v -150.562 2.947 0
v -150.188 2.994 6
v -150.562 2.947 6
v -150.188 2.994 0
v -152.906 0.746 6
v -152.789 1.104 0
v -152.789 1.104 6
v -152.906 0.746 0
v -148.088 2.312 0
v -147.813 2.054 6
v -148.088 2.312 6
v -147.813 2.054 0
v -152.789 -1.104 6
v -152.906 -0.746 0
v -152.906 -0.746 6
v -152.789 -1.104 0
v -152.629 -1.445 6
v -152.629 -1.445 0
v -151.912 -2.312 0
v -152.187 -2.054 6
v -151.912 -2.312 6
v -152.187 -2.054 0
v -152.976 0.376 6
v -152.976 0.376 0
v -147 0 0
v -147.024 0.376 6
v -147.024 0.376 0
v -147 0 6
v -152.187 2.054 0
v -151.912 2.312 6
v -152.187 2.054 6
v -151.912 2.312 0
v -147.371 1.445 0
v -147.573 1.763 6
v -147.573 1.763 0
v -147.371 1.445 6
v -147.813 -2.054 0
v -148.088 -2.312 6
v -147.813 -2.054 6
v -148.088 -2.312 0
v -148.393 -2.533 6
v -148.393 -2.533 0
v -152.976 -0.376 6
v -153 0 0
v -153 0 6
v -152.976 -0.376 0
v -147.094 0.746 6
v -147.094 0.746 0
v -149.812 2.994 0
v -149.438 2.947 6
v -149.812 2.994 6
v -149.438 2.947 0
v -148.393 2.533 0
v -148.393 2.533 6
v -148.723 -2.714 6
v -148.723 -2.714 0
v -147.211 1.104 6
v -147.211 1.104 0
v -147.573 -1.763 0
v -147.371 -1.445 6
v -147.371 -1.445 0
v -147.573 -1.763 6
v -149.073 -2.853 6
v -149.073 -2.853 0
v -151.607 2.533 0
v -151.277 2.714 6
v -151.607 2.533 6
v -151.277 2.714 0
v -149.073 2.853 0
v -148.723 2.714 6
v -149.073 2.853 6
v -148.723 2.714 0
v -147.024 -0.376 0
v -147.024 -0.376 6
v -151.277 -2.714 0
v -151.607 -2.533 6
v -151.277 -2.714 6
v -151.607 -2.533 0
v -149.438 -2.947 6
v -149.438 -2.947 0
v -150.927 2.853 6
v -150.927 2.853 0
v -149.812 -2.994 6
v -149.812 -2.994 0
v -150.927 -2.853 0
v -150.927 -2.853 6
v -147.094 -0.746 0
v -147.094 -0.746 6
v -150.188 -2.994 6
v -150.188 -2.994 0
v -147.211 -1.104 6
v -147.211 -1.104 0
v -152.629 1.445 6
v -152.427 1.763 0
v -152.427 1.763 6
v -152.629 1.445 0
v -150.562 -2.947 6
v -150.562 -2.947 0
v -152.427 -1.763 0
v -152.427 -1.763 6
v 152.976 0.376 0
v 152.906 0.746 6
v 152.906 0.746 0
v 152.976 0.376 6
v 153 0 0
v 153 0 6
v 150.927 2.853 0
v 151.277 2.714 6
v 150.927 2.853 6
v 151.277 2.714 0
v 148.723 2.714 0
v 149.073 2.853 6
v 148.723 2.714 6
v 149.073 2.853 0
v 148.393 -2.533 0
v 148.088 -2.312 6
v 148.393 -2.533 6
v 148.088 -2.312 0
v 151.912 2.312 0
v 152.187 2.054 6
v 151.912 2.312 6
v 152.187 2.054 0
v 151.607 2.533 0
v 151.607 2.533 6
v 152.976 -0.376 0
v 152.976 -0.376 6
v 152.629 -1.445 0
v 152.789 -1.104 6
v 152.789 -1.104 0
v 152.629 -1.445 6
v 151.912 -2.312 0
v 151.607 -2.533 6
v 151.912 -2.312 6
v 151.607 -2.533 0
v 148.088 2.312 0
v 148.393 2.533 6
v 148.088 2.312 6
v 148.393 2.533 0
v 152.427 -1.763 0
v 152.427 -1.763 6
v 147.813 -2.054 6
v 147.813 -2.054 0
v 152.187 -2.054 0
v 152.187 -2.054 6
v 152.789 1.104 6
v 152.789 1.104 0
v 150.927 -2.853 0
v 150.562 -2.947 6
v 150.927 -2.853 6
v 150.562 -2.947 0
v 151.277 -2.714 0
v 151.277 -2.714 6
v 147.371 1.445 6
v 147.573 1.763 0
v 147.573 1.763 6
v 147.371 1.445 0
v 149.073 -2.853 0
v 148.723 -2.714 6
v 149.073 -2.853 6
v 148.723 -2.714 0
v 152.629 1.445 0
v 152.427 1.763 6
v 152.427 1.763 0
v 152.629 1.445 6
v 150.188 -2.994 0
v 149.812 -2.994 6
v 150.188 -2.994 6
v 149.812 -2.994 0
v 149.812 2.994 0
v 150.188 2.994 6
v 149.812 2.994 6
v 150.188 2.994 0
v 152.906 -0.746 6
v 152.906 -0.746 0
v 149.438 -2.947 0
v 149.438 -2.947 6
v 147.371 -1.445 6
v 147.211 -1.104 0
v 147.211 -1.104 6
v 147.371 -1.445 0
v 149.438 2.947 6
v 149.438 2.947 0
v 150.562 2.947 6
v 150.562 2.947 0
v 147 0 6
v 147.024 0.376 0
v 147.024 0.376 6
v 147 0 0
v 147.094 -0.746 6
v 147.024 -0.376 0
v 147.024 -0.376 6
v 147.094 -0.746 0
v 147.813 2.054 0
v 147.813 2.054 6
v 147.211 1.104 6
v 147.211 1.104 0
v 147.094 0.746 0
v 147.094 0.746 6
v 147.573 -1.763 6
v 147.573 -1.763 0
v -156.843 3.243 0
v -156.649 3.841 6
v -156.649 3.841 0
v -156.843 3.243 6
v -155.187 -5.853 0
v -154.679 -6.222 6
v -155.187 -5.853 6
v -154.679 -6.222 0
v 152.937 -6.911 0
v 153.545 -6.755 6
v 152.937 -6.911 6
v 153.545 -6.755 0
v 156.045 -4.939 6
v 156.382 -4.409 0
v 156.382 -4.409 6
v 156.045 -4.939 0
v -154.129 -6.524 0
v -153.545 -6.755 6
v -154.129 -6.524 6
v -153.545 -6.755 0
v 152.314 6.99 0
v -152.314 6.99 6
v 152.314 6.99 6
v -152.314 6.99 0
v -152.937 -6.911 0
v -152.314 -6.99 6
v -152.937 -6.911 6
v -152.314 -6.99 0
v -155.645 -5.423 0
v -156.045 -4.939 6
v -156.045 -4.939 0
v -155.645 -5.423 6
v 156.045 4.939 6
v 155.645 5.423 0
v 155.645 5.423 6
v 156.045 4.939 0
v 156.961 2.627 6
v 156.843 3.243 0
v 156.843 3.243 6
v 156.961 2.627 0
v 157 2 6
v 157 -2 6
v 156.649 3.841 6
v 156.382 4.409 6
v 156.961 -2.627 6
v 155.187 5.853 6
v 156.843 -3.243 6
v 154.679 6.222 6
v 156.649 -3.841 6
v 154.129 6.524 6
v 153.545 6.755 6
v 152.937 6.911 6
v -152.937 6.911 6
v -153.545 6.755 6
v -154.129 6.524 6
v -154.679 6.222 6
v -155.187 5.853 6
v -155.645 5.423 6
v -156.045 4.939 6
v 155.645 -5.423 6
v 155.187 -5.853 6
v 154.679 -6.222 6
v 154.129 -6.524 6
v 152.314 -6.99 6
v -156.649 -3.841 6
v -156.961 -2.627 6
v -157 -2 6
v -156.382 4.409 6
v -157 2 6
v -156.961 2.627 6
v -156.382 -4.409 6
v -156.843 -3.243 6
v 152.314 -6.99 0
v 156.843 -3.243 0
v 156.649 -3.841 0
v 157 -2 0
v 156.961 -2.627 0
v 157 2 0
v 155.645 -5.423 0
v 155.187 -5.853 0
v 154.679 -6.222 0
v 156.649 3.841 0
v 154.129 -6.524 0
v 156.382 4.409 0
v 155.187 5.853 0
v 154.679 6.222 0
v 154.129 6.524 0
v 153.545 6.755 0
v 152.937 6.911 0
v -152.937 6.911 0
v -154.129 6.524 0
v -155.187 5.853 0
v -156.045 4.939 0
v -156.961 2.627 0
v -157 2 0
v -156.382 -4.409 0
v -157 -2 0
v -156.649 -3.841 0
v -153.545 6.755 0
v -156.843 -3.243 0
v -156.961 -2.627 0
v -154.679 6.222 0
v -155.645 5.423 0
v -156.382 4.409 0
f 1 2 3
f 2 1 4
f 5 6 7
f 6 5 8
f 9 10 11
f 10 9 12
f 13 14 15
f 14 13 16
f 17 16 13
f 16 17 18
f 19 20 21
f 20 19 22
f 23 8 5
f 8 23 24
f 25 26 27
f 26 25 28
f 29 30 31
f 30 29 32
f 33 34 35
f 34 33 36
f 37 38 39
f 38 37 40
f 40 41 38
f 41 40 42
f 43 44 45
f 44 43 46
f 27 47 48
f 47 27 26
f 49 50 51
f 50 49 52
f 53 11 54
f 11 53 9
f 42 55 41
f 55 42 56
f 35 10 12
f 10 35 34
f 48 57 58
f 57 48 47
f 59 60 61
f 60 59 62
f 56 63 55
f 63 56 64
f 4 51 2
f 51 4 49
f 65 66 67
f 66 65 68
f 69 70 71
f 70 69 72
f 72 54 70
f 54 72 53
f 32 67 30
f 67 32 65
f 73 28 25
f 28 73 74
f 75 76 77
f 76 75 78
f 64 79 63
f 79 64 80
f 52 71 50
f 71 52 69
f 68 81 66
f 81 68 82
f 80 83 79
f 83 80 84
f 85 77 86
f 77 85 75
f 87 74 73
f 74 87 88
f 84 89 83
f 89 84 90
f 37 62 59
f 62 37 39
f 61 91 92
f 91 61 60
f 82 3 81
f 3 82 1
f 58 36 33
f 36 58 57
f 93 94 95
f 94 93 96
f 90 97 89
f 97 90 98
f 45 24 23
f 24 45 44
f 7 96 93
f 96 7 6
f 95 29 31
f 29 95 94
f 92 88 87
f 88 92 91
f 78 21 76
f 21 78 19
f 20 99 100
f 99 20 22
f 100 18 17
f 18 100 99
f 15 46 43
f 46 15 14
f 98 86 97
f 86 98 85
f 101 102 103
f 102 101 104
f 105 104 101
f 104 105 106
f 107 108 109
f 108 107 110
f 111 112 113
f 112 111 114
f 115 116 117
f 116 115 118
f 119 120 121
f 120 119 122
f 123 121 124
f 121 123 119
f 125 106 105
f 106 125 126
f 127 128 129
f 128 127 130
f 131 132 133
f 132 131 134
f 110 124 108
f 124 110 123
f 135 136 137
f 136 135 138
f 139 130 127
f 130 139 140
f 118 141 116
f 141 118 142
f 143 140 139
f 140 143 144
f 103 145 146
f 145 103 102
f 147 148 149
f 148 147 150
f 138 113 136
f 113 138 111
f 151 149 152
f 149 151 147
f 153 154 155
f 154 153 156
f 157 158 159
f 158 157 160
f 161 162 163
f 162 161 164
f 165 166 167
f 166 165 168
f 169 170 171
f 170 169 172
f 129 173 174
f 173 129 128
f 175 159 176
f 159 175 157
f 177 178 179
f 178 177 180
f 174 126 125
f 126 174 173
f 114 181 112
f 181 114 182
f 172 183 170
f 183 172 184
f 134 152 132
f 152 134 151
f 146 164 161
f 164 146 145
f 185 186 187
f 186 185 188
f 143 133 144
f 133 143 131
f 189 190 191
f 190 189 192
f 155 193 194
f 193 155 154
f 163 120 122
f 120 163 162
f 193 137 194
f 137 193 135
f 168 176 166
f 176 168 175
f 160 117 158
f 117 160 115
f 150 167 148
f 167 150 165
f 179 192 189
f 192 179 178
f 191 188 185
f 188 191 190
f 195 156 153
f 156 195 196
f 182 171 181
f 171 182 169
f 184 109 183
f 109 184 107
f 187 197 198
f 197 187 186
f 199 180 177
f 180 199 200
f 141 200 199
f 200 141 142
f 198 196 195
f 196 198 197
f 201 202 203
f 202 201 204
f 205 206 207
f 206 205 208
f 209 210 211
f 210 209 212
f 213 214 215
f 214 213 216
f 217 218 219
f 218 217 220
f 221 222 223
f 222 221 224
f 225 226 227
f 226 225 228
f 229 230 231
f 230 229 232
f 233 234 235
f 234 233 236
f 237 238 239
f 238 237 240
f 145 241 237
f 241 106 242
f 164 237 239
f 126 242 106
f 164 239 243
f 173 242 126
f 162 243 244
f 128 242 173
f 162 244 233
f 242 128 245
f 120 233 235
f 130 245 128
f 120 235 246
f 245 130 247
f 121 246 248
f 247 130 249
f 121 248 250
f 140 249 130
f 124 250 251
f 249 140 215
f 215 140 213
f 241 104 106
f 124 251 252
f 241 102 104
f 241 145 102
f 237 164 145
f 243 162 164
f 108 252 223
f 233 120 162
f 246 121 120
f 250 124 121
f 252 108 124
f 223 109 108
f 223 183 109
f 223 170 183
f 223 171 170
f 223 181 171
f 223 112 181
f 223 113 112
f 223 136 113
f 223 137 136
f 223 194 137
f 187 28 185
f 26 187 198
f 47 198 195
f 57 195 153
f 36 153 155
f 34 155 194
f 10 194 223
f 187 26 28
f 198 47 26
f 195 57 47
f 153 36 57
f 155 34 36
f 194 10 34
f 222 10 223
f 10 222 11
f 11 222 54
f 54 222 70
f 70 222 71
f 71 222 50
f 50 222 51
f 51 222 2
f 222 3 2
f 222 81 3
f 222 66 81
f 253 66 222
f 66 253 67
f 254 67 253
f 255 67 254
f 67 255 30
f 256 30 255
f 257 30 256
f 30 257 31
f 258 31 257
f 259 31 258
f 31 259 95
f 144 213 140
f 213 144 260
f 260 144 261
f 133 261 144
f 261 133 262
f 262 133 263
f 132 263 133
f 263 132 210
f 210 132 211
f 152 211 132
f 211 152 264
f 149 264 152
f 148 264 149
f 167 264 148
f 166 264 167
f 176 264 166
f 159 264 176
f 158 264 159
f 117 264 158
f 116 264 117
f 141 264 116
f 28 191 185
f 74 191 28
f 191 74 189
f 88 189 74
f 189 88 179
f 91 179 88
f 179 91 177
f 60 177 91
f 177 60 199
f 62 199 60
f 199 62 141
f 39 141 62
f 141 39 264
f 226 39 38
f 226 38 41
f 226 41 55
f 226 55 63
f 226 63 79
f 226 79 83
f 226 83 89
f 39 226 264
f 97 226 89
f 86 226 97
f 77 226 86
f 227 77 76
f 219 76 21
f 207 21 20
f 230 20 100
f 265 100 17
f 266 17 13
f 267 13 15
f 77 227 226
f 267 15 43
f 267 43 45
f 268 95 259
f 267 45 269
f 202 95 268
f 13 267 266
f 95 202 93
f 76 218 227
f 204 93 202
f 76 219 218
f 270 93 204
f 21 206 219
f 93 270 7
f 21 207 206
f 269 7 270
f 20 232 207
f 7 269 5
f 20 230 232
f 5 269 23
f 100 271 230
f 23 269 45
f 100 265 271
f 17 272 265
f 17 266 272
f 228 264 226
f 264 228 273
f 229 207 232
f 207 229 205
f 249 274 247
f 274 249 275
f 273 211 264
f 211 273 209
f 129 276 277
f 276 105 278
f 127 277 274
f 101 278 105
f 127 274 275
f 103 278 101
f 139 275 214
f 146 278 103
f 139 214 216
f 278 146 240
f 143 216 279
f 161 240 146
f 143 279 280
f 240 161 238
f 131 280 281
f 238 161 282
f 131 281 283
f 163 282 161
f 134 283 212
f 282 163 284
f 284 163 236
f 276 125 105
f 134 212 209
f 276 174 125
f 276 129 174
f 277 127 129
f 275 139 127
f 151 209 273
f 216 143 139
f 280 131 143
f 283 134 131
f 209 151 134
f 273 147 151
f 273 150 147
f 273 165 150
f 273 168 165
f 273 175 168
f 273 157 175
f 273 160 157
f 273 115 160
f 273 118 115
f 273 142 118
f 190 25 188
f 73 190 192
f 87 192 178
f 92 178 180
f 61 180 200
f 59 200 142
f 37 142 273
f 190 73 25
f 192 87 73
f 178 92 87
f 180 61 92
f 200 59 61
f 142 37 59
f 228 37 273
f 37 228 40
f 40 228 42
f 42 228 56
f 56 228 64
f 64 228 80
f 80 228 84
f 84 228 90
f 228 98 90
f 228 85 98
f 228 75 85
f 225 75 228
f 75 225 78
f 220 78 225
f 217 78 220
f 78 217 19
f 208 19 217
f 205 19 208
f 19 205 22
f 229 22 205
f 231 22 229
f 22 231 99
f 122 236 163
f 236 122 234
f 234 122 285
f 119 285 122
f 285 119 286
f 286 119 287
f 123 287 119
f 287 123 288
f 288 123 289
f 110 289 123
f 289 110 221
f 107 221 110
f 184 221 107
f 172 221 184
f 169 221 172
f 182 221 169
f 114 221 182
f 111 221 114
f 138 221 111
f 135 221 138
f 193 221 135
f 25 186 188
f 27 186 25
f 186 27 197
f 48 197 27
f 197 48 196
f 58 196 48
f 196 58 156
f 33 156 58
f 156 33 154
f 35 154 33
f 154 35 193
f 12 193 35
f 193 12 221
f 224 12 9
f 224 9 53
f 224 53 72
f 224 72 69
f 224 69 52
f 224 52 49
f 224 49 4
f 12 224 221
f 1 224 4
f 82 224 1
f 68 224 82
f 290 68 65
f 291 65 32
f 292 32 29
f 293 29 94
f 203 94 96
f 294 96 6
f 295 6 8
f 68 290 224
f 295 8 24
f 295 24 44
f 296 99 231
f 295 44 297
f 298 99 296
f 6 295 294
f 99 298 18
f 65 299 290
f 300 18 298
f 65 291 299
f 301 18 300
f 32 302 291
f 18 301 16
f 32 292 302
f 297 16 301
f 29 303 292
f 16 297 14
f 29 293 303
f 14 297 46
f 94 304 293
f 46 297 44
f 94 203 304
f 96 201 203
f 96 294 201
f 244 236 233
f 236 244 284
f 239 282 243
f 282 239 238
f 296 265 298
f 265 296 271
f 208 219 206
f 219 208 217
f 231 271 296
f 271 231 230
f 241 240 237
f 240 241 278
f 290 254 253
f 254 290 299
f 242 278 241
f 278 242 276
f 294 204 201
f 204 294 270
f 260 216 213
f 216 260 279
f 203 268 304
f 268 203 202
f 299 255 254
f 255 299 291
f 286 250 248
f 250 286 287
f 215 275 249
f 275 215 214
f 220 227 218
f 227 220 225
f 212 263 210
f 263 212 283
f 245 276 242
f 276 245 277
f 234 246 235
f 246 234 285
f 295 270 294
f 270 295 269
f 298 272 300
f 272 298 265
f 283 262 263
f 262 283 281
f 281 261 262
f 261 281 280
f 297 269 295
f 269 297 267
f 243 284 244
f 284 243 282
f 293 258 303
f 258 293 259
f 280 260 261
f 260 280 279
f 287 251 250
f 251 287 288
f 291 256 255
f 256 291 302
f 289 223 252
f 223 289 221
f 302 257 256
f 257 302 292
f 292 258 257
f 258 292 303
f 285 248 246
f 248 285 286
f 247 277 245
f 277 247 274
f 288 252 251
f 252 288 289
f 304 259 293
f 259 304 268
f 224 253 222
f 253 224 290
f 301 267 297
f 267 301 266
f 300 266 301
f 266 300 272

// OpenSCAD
$fn = 50;


difference() {
	union() {
		hull() {
			translate(v = [-152.0000000000, 2.0000000000, 0]) {
				cylinder(h = 6, r = 5);
			}
			translate(v = [152.0000000000, 2.0000000000, 0]) {
				cylinder(h = 6, r = 5);
			}
			translate(v = [-152.0000000000, -2.0000000000, 0]) {
				cylinder(h = 6, r = 5);
			}
			translate(v = [152.0000000000, -2.0000000000, 0]) {
				cylinder(h = 6, r = 5);
			}
		}
	}
	union() {
		translate(v = [-150.0000000000, 0.0000000000, -100.0000000000]) {
			cylinder(h = 200, r = 3.0000000000);
		}
		translate(v = [-150.0000000000, 0.0000000000, -100.0000000000]) {
			cylinder(h = 200, r = 3.0000000000);
		}
		translate(v = [150.0000000000, 0.0000000000, -100.0000000000]) {
			cylinder(h = 200, r = 3.0000000000);
		}
		translate(v = [150.0000000000, 0.0000000000, -100.0000000000]) {
			cylinder(h = 200, r = 3.0000000000);
		}
	}
}
